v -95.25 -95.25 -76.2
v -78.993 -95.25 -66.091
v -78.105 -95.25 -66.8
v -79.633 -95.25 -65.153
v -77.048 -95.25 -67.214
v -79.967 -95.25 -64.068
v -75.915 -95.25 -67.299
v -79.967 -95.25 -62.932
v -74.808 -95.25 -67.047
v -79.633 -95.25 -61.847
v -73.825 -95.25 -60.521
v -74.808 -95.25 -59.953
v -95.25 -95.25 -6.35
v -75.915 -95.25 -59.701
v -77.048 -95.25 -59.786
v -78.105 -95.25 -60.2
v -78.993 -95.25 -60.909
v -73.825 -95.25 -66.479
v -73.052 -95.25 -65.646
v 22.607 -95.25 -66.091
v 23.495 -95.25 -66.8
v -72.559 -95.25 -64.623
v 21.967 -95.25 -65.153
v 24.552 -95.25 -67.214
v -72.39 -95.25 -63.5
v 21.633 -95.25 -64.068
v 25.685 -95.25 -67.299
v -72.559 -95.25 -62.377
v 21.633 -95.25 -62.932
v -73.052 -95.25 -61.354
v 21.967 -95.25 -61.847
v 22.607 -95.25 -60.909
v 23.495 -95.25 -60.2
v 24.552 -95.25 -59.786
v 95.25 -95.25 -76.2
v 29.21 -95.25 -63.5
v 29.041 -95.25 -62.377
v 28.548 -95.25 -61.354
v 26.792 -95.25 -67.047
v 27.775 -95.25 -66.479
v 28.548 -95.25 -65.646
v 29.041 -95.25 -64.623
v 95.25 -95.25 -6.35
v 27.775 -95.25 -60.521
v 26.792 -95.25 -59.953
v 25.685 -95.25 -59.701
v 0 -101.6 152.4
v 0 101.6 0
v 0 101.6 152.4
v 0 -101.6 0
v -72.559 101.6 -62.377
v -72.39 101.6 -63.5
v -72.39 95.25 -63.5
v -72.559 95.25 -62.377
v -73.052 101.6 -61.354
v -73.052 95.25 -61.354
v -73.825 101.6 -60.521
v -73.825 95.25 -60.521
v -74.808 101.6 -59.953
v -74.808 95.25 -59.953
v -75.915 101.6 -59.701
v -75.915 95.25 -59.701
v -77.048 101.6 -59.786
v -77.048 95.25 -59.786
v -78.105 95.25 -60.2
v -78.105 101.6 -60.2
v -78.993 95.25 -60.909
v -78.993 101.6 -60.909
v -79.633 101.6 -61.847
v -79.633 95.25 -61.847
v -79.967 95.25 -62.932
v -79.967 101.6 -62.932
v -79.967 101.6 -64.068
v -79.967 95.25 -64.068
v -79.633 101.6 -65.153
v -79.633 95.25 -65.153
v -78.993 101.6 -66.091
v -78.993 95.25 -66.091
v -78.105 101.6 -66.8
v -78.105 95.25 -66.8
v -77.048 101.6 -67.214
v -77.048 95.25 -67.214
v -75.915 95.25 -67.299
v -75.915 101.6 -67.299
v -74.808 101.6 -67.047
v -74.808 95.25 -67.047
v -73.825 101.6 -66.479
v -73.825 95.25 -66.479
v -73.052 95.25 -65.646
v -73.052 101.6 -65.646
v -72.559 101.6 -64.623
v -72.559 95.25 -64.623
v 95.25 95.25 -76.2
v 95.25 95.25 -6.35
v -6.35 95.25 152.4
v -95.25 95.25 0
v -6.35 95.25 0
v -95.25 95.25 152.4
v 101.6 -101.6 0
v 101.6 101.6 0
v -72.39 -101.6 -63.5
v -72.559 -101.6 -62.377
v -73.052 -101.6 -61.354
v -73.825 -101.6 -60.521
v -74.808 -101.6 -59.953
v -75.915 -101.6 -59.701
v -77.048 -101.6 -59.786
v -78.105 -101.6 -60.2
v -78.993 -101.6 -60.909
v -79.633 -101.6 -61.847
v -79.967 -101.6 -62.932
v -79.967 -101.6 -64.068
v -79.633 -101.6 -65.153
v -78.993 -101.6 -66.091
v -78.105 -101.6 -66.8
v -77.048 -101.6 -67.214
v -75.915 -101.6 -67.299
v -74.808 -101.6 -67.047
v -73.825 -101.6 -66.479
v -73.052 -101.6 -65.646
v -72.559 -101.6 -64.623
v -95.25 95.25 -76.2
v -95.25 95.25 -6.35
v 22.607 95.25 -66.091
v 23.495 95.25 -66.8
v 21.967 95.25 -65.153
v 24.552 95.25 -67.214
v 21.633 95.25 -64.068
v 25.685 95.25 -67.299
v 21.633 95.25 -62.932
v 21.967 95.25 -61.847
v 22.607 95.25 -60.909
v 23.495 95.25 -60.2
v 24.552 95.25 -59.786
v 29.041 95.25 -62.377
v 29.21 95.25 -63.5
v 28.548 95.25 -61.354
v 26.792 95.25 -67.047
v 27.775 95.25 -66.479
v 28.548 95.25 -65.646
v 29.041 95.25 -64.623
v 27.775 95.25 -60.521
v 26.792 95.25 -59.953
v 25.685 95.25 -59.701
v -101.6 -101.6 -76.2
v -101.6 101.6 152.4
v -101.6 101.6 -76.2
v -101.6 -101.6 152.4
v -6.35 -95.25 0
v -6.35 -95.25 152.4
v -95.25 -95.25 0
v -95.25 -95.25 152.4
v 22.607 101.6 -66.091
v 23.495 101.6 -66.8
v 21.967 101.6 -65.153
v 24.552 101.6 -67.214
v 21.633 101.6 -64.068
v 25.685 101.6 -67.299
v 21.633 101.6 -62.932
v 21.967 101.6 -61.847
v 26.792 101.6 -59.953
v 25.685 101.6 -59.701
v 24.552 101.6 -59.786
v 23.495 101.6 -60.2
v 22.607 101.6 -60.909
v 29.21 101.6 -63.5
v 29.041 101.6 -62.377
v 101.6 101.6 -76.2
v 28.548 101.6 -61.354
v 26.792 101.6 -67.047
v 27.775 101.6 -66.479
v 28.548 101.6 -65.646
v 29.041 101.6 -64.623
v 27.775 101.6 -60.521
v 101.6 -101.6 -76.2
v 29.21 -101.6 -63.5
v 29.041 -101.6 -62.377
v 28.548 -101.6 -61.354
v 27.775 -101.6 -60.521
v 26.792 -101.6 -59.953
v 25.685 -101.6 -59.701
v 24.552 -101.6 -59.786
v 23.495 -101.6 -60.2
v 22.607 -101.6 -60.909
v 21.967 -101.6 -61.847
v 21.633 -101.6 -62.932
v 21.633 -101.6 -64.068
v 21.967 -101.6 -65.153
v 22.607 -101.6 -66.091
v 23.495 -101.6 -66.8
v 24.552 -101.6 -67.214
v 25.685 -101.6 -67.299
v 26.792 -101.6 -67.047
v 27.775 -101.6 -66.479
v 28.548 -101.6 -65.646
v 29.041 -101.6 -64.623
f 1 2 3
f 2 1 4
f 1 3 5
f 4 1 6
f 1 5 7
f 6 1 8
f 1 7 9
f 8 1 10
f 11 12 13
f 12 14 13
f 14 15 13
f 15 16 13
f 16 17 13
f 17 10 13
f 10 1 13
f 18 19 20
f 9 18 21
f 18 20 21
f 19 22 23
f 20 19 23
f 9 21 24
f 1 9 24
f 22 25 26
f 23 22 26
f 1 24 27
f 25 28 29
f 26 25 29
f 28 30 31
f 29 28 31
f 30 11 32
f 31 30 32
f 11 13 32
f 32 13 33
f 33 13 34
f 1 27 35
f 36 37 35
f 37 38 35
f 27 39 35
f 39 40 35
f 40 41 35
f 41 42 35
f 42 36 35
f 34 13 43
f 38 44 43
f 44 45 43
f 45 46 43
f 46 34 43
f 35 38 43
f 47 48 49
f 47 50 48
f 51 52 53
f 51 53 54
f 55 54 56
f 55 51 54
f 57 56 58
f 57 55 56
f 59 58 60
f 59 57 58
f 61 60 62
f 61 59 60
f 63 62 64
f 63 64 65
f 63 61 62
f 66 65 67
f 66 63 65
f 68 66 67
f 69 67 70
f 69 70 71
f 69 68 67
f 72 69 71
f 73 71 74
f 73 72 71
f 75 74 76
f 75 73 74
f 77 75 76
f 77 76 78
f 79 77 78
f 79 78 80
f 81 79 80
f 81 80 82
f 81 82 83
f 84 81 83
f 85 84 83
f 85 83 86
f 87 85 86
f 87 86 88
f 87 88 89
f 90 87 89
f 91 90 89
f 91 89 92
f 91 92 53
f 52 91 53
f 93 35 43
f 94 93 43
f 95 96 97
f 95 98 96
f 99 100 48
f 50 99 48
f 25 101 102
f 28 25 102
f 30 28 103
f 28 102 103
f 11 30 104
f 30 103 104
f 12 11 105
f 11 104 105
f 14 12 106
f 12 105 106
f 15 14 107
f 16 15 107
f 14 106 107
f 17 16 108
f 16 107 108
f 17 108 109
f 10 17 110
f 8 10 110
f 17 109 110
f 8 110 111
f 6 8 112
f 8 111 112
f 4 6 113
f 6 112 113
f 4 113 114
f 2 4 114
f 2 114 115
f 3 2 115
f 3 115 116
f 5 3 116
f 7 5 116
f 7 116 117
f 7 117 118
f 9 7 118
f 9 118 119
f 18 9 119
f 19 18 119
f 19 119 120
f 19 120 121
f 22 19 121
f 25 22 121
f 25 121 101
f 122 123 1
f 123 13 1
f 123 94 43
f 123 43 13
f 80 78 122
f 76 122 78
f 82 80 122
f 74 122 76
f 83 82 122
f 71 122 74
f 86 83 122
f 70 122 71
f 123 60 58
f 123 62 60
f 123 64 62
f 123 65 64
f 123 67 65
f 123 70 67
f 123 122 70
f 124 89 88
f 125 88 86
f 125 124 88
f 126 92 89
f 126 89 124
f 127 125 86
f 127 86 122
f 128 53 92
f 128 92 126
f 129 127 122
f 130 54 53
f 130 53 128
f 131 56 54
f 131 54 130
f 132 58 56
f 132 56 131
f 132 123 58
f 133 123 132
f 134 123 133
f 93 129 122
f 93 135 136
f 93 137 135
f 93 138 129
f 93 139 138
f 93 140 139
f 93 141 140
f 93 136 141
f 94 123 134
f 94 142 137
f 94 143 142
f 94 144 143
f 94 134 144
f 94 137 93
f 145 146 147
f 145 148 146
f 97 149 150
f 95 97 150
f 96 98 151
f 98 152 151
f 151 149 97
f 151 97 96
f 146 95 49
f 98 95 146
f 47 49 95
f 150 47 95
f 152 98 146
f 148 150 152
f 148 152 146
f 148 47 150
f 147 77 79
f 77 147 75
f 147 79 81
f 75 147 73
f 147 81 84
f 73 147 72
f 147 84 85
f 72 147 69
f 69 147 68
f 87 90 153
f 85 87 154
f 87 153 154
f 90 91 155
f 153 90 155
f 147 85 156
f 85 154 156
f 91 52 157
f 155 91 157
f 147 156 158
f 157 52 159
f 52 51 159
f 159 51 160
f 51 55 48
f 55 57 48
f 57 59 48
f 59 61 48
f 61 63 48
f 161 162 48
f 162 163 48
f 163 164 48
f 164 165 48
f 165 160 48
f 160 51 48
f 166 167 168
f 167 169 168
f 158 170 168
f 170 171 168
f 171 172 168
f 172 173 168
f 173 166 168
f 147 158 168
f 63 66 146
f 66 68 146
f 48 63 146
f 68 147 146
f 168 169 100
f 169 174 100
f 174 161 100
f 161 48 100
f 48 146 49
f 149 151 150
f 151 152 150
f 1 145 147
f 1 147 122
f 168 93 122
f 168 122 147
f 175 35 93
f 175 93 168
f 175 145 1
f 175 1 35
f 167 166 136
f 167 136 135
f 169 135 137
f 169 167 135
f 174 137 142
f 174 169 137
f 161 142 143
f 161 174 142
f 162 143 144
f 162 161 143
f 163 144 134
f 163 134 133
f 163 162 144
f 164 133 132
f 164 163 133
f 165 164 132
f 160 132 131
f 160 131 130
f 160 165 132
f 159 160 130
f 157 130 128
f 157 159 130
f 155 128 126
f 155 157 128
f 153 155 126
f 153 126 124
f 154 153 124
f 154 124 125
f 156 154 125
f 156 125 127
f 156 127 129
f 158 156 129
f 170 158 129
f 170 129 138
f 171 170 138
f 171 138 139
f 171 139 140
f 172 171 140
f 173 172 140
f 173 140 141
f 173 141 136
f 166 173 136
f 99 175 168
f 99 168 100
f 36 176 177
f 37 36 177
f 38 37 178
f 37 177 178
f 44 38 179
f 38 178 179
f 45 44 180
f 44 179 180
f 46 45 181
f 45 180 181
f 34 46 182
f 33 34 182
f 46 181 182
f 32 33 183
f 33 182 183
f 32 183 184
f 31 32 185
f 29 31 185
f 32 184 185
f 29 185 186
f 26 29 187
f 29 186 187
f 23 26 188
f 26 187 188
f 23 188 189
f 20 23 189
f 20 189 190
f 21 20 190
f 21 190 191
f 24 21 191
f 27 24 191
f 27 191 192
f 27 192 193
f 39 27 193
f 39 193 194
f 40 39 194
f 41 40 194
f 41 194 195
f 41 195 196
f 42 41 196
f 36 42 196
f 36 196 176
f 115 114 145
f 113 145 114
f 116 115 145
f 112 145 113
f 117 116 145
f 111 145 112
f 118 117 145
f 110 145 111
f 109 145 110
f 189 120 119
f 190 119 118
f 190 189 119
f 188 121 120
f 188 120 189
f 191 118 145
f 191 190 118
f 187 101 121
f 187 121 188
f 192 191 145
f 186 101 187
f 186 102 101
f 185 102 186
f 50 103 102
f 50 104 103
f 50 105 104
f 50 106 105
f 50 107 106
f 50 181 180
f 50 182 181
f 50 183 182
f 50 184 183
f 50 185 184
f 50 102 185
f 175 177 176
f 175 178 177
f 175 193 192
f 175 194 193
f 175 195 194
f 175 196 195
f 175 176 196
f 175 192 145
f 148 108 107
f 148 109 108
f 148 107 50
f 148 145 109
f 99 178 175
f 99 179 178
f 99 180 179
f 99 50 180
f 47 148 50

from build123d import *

# Parameters (mm, degrees)
F1_DEPTH = 101.6
F2_T     = -6.35
F3_W     = 88.9
F3_H     = 6.35
F4_DEPTH = 95.25
F5_R     = 3.81
F6_DEPTH = 25.4


with BuildPart() as f1:
    # F0 (on Front) → F1 (new body)
    with BuildSketch(Plane.XZ):
        Polygon((0, 0), (0, 152.4), (-101.6, 152.4), (-101.6, 0), (-101.6, -76.2), (101.6, -76.2), (101.6, 0), align=None)
    extrude(amount=F1_DEPTH)

    # F2
    f2_openings = [f1.faces().sort_by_distance(p)[0] for p in [
        (-50.8, -50.8, 152.4),
        (-25.4, 0, 19.05),
        (0, -50.8, -76.2),
    ]]
    offset(amount=F2_T, openings=f2_openings, kind=Kind.INTERSECTION)

    # F3 (on face) → F4 (join)
    with BuildSketch(Plane(origin=(0, -95.25, 0), x_dir=(-1, 0, 0), z_dir=(0, 1, 0))):
        with Locations((50.8, -3.175)):
            Rectangle(F3_W, F3_H)
    extrude(amount=F4_DEPTH)

    # F5 (on face) → F6 (cut)
    with BuildSketch(Plane.XZ.offset(101.6)):
        with Locations((-76.2, -63.5)):
            Circle(F5_R)
        with Locations((25.4, -63.5)):
            Circle(F5_R)
    extrude(amount=-F6_DEPTH, mode=Mode.SUBTRACT)

    # F7: F1 across face


with BuildPart() as f1_1:
    add(f1.part)
    add(f1.part.mirror(Plane(origin=(-23.9058823529, 0, 25.9602941176), x_dir=(1, 0, 0), z_dir=(0, 1, 0))))


solid = f1_1.part
